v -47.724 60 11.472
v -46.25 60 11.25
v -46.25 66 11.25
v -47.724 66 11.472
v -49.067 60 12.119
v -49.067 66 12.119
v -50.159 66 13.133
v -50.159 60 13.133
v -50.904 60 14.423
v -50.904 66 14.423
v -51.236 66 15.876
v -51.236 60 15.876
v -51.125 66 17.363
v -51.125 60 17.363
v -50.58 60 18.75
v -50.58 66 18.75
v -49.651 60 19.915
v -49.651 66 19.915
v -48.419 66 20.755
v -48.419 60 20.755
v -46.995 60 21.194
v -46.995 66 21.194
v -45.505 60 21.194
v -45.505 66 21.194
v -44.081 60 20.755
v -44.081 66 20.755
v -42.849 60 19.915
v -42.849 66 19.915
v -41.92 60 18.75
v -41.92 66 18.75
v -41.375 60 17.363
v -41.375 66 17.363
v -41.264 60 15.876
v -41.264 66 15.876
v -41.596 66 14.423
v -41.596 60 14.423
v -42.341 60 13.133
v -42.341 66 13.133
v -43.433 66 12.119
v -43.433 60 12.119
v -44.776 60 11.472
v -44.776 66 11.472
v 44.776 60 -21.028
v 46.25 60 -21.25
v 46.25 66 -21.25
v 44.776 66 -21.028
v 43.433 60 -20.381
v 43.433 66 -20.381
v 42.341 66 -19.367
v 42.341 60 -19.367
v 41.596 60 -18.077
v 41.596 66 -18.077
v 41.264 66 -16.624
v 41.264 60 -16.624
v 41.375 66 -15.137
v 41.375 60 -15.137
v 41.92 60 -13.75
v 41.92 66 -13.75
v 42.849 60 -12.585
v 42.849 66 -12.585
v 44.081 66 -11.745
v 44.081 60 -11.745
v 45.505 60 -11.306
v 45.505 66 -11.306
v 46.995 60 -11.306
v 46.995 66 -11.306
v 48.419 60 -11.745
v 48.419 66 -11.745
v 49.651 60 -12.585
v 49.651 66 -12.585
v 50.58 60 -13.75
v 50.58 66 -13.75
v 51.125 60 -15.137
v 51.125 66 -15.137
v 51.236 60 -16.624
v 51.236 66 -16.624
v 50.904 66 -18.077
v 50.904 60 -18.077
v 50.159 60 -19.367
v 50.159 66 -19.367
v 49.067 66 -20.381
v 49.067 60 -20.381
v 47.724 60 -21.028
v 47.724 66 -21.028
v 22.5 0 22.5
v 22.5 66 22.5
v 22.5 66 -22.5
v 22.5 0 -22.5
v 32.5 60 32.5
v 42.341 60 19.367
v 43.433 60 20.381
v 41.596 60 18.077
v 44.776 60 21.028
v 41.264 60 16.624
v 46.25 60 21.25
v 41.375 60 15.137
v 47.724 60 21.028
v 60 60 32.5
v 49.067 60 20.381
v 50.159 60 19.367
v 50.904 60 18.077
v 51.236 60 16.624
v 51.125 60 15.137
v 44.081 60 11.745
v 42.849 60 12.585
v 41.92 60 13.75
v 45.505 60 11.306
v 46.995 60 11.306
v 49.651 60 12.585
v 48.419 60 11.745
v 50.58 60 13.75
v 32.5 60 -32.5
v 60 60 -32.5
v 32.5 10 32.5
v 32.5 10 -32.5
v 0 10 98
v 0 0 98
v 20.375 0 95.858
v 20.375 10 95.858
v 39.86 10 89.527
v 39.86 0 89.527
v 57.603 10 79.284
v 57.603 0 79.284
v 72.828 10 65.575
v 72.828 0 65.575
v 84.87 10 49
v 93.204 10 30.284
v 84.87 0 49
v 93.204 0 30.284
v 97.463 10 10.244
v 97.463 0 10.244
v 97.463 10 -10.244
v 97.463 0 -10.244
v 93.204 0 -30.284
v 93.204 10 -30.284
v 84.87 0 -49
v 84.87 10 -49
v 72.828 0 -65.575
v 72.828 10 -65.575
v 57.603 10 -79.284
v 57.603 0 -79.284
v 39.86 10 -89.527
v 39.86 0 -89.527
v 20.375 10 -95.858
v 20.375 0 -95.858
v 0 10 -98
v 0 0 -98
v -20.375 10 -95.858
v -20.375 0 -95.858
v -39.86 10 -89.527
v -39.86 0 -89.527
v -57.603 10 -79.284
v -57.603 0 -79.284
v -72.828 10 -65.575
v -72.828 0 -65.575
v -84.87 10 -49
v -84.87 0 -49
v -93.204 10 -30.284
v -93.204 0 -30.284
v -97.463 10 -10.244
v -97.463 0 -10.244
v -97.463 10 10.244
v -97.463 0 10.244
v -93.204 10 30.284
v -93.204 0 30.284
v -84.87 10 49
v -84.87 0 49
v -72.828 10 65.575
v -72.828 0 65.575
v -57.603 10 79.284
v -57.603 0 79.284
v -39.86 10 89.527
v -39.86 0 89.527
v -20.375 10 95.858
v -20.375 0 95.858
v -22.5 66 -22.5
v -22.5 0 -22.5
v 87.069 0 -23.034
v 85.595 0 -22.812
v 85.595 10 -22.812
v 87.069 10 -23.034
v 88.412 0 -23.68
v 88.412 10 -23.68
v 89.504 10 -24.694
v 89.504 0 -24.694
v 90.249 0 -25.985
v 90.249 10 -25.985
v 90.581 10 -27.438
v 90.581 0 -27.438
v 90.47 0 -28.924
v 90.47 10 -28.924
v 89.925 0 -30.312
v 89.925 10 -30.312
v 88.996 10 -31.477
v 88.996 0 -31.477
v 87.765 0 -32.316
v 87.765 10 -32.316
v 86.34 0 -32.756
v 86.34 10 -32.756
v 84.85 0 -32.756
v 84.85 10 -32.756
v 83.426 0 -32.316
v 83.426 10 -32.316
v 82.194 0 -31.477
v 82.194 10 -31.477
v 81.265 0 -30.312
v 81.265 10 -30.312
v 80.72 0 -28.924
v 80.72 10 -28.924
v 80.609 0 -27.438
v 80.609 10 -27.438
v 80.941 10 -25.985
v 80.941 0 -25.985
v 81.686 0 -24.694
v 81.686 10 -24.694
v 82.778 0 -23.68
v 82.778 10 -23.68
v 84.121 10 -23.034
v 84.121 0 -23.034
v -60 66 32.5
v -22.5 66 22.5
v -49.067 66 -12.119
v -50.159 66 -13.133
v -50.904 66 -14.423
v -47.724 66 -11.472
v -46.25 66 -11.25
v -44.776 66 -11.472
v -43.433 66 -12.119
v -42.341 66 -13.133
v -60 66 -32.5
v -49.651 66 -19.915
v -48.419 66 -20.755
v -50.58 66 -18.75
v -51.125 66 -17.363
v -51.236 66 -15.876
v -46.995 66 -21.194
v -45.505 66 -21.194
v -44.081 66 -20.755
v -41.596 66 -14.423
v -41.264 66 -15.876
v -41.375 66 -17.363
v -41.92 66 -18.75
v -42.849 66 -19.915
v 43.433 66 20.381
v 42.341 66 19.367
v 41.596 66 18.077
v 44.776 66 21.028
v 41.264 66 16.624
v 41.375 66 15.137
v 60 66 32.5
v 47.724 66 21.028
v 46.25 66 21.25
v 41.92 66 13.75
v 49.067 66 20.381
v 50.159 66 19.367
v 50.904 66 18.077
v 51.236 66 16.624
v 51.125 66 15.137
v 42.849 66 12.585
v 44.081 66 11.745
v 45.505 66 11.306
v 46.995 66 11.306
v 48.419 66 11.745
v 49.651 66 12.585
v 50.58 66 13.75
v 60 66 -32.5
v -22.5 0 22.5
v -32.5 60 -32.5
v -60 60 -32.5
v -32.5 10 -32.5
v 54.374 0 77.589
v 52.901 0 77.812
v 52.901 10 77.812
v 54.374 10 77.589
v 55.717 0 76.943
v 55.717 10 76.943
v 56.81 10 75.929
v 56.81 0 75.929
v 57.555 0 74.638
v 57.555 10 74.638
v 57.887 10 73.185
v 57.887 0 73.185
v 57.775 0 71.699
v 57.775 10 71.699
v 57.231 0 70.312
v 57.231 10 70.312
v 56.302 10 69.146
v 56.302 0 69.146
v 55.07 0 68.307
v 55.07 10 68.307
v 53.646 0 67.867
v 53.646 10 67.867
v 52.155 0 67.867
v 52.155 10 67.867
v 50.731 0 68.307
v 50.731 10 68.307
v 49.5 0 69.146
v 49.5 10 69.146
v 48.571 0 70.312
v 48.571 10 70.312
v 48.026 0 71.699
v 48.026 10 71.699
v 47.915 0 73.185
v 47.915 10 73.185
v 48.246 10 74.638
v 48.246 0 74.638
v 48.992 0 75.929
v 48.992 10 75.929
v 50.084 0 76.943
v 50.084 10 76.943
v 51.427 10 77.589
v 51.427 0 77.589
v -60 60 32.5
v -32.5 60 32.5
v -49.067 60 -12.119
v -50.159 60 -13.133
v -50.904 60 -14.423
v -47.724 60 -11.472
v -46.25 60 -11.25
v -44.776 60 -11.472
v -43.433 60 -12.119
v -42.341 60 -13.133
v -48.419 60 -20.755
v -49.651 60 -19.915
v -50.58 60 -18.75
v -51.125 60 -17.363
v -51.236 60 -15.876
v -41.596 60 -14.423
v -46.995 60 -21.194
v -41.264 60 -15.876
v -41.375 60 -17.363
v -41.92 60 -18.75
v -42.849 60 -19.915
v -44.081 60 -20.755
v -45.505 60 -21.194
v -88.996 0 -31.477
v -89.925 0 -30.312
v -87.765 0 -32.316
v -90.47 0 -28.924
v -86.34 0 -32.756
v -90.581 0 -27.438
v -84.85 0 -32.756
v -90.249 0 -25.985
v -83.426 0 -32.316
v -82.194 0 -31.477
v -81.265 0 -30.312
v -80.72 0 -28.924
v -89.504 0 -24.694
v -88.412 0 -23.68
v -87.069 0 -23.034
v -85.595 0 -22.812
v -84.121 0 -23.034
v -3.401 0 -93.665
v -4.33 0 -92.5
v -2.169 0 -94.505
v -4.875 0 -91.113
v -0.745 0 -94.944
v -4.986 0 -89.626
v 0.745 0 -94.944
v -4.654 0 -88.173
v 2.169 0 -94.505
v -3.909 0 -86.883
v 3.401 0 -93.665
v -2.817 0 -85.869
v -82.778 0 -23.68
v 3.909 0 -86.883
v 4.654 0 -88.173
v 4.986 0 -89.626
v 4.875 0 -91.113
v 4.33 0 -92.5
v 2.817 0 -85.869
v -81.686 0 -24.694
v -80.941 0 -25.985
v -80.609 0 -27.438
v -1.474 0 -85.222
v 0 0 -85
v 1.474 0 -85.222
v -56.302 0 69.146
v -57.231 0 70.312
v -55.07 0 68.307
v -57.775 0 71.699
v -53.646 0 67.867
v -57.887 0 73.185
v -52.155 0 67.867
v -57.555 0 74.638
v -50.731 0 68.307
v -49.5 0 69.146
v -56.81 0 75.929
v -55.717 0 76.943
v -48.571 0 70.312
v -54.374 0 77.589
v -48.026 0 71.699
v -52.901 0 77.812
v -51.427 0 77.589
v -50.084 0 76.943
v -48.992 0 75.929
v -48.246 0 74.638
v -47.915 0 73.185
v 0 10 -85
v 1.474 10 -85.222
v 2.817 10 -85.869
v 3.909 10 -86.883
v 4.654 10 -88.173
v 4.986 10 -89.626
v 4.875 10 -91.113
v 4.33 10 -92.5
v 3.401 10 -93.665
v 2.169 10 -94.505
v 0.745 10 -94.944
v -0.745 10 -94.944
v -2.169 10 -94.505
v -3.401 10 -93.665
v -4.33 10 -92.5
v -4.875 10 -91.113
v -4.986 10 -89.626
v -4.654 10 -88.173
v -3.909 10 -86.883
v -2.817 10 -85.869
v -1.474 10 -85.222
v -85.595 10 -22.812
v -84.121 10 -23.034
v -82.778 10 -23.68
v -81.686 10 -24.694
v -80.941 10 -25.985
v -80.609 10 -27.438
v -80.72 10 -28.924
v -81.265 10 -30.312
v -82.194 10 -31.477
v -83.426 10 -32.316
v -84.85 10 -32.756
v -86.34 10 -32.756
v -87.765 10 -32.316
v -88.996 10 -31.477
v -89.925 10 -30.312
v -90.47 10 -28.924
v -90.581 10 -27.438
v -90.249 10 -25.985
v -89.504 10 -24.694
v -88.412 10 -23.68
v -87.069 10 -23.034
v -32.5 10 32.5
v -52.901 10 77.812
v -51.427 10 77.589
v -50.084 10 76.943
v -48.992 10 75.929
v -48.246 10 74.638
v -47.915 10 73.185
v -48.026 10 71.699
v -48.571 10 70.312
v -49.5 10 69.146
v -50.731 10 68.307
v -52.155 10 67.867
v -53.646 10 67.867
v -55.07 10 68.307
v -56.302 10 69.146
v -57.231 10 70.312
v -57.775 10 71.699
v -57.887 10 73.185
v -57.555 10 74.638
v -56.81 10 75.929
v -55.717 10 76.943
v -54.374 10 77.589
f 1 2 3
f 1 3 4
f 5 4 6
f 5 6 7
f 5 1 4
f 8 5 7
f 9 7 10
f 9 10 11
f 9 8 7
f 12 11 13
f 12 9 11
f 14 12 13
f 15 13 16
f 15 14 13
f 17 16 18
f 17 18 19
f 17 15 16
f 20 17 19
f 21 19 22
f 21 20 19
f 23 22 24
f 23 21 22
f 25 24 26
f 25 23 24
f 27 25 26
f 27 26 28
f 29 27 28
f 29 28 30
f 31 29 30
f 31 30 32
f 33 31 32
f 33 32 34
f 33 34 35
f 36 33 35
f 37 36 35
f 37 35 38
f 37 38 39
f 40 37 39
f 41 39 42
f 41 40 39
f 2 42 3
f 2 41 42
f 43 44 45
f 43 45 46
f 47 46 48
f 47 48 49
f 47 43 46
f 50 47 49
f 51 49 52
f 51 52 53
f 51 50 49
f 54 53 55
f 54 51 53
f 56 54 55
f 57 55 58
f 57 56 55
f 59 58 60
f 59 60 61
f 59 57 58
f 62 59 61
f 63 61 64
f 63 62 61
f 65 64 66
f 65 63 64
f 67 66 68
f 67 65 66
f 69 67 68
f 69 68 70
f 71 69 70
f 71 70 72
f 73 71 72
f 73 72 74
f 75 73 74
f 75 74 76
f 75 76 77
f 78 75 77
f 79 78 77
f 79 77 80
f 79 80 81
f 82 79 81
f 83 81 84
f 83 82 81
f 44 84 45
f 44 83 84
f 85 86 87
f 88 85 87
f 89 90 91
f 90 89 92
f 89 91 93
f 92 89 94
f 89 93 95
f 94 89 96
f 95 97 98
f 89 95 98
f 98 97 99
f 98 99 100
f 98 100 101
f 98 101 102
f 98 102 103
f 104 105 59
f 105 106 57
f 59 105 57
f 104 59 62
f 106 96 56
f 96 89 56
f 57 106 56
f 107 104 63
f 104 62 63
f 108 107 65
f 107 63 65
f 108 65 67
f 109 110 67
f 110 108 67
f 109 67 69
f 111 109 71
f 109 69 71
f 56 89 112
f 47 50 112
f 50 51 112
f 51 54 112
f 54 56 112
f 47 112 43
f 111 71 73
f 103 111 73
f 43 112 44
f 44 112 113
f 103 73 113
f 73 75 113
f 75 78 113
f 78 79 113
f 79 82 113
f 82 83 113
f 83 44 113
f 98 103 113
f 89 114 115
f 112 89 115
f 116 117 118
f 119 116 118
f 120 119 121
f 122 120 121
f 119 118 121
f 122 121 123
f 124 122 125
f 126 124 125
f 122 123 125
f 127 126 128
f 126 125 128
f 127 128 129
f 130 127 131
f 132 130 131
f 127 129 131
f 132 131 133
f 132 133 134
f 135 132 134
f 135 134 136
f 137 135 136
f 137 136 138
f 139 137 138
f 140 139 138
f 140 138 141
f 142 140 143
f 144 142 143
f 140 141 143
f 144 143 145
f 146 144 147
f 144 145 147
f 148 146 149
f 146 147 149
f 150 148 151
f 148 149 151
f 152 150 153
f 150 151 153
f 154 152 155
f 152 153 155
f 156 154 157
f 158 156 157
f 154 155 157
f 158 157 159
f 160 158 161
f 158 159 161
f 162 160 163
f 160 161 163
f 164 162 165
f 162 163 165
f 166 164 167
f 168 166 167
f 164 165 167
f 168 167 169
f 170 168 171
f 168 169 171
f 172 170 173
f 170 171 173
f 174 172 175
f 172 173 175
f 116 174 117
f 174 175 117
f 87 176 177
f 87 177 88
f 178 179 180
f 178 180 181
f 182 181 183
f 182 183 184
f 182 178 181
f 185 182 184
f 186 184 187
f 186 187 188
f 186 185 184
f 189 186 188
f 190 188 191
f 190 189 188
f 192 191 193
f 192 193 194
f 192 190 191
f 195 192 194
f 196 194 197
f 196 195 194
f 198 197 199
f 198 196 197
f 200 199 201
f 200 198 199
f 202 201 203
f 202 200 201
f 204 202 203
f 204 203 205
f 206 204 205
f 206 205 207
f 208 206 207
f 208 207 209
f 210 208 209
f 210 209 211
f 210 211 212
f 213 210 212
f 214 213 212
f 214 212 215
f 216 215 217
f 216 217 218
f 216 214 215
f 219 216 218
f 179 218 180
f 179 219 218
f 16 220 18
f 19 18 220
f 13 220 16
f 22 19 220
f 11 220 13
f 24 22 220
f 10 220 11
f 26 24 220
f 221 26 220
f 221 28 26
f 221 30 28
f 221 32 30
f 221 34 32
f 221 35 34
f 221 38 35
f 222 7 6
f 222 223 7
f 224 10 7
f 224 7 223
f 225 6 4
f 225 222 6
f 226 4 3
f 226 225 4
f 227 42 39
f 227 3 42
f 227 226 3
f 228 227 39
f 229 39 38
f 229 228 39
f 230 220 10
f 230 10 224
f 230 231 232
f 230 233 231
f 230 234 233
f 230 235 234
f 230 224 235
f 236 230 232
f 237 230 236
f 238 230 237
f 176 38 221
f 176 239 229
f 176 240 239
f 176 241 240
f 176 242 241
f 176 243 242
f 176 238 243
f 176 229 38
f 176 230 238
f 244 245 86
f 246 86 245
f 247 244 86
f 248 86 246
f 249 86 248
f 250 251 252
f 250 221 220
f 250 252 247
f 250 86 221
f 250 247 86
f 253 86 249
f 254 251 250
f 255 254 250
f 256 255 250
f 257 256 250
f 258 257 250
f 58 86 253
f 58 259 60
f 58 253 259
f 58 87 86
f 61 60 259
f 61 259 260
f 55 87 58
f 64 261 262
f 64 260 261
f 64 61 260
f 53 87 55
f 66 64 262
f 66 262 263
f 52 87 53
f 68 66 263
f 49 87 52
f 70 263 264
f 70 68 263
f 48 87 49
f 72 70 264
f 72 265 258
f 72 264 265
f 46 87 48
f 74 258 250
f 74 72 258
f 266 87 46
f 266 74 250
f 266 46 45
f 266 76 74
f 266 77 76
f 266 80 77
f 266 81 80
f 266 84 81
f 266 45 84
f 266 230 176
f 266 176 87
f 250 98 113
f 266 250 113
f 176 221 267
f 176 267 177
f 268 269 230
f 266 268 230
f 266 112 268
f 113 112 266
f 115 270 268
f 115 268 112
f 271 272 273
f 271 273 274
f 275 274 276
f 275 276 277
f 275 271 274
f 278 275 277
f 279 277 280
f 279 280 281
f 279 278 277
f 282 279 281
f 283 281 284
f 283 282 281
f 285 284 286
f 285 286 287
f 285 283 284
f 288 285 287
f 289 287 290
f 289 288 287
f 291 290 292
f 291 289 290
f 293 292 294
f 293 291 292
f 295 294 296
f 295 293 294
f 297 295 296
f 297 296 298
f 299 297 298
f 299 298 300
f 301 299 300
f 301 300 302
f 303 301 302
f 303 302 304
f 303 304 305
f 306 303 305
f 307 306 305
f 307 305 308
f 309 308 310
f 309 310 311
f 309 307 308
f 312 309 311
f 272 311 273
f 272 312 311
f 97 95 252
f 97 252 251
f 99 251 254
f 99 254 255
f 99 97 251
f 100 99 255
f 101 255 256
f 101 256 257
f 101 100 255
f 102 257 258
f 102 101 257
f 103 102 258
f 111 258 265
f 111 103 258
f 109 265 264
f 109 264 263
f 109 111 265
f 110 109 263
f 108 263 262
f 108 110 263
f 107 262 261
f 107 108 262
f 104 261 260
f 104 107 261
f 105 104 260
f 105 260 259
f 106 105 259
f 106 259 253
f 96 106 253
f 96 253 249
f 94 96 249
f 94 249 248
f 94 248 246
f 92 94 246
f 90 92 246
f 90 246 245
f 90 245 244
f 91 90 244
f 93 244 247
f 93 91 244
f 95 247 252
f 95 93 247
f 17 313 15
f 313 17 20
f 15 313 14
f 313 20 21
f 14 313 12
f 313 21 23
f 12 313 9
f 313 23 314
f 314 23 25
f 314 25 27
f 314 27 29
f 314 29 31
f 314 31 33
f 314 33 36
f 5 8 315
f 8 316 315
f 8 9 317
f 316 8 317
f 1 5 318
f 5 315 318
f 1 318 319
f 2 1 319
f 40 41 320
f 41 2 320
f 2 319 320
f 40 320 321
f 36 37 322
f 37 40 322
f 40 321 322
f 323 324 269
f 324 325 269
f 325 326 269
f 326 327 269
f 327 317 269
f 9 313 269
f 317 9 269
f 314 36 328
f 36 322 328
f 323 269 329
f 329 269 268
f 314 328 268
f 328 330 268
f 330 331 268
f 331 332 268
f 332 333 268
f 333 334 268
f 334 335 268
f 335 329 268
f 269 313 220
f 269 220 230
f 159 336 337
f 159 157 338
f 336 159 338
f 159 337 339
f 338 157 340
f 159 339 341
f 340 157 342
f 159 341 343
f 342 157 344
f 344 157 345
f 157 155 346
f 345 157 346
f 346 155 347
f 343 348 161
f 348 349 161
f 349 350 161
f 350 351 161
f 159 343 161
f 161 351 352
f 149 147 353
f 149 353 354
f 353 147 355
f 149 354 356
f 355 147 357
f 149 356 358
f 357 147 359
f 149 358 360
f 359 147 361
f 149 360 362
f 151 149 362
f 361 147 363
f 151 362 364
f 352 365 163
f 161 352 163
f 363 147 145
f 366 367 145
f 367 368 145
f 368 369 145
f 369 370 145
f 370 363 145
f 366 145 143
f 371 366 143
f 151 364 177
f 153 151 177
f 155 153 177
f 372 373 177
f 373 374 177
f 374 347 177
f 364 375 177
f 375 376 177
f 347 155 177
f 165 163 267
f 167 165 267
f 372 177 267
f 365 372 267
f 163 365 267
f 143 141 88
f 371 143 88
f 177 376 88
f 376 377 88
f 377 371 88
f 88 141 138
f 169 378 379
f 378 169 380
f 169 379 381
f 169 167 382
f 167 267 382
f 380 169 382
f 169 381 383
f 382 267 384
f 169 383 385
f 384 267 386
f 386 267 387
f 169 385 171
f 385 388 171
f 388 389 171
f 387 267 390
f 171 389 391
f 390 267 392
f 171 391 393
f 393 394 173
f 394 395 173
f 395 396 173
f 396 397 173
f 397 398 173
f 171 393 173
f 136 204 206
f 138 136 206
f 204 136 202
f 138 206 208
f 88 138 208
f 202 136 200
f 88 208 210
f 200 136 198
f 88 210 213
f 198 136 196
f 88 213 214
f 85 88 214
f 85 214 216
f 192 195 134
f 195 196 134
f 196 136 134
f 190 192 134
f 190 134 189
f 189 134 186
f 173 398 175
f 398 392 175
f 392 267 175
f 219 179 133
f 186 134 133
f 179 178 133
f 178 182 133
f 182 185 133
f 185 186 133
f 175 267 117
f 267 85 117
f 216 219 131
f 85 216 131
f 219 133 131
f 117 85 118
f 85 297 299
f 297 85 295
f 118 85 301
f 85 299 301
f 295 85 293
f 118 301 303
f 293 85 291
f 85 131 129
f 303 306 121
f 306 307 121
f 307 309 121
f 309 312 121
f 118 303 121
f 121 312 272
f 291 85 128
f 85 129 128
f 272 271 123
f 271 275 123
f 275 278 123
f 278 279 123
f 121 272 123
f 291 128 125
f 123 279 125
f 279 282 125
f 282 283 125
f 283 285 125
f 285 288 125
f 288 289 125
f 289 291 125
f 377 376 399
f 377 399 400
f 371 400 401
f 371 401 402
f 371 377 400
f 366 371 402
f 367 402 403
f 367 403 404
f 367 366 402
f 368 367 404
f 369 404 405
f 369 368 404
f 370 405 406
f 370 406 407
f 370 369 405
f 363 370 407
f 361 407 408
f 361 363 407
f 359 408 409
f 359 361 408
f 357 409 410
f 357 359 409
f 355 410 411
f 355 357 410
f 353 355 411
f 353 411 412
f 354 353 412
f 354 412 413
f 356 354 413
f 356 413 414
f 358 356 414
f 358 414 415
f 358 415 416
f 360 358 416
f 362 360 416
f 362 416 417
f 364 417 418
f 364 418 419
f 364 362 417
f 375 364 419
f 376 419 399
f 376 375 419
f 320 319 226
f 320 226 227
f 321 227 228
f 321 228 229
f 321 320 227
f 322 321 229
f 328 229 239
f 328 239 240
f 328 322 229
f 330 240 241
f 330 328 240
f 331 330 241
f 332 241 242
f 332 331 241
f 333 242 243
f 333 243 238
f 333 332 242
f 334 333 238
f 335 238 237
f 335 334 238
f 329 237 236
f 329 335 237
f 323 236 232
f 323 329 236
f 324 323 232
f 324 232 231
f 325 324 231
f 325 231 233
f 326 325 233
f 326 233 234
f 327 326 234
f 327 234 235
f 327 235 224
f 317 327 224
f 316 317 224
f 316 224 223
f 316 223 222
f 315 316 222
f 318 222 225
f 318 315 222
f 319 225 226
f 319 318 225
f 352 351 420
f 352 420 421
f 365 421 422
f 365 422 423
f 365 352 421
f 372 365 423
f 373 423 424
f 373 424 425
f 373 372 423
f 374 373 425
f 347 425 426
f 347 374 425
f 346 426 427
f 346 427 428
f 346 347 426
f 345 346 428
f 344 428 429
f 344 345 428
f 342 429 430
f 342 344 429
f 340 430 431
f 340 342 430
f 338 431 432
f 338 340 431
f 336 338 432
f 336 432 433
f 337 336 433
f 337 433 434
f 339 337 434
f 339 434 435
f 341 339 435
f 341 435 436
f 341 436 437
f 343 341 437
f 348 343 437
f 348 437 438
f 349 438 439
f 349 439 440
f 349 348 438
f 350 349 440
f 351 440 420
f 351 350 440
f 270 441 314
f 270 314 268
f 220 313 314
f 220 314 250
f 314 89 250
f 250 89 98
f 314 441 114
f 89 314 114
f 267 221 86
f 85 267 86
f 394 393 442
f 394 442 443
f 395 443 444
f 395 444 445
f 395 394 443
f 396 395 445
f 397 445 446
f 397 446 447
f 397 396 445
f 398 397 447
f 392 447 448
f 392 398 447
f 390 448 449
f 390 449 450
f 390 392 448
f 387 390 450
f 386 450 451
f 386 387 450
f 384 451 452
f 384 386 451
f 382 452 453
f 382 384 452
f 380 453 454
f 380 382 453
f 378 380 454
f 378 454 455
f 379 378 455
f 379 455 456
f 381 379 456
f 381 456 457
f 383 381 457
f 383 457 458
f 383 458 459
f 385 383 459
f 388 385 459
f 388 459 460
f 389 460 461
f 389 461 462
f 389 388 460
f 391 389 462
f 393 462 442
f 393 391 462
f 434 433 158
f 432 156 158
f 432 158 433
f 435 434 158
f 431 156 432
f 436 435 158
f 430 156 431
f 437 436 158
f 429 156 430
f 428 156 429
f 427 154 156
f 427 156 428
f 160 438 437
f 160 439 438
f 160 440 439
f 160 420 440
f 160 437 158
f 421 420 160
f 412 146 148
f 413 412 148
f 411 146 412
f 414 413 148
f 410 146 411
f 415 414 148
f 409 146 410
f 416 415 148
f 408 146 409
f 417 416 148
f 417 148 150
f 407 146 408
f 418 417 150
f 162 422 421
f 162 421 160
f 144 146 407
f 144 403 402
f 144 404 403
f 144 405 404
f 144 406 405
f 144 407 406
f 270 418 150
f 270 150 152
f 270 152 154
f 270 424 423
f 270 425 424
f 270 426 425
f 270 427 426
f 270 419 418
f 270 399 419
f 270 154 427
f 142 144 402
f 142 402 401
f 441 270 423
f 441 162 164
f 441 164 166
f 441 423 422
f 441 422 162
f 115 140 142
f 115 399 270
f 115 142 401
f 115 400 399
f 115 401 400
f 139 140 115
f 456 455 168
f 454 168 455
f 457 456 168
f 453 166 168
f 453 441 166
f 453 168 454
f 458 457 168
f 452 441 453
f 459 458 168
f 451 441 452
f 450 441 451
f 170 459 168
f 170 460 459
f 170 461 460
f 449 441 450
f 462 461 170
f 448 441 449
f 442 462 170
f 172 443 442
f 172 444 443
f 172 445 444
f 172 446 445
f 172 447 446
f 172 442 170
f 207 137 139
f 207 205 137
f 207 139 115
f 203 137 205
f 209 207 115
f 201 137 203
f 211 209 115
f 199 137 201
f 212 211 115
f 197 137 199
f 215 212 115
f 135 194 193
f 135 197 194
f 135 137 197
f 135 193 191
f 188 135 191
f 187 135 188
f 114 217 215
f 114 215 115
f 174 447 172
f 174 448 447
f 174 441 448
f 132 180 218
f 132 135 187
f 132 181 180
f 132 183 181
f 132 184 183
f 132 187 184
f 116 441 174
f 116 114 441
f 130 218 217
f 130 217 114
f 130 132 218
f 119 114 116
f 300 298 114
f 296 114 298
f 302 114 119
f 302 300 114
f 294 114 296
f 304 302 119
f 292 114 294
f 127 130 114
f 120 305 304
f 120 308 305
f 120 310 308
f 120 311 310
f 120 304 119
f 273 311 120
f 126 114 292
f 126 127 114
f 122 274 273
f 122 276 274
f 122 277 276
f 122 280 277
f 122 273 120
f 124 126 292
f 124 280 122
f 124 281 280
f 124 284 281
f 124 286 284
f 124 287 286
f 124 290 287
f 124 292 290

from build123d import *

# Parameters (mm, degrees)
SKETCH1_R           = 98
SKETCH1_R_2         = 5
BOSS_EXTRUDE1_DEPTH = 10
SKETCH2_W           = 65
SKETCH2_H           = 65
BOSS_EXTRUDE2_DEPTH = 50
SKETCH3_W           = 120
SKETCH3_H           = 65
SKETCH3_R           = 5
BOSS_EXTRUDE3_DEPTH = 6
SKETCH4_W           = 45
SKETCH4_H           = 45
CUT_EXTRUDE1_DEPTH  = 154.50570022


with BuildPart() as part:
    # Sketch1 → Boss-Extrude1 (new body)
    with BuildSketch(Plane(origin=(0, 0, 0), x_dir=(1, 0, 0), z_dir=(0, 1, 0))):
        with Locations(Location((0, 0, 0), (0, 0, 270))):
            Circle(SKETCH1_R)
        with Locations(Location((0, 90, 0), (0, 0, 270))):
            Circle(SKETCH1_R_2, mode=Mode.SUBTRACT)
        with Locations(Location((85.595086467, 27.811529494, 0), (0, 0, 270))):
            Circle(SKETCH1_R_2, mode=Mode.SUBTRACT)
        with Locations(Location((52.900672706, -72.811529494, 0), (0, 0, 270))):
            Circle(SKETCH1_R_2, mode=Mode.SUBTRACT)
        with Locations(Location((-52.900672706, -72.811529494, 0), (0, 0, 270))):
            Circle(SKETCH1_R_2, mode=Mode.SUBTRACT)
        with Locations(Location((-85.595086467, 27.811529494, 0), (0, 0, 270))):
            Circle(SKETCH1_R_2, mode=Mode.SUBTRACT)
    extrude(amount=BOSS_EXTRUDE1_DEPTH)

    # Sketch2 → Boss-Extrude2 (add)
    with BuildSketch(Plane(origin=(0, 10, 0), x_dir=(1, 0, 0), z_dir=(0, 1, 0))):
        Rectangle(SKETCH2_W, SKETCH2_H)
    extrude(amount=BOSS_EXTRUDE2_DEPTH)

    # Sketch3 → Boss-Extrude3 (add)
    with BuildSketch(Plane(origin=(0, 60, 0), x_dir=(1, 0, 0), z_dir=(0, 1, 0))):
        Rectangle(SKETCH3_W, SKETCH3_H)
        with Locations(Location((-46.25, 16.25, 0), (0, 0, 270))):
            Circle(SKETCH3_R, mode=Mode.SUBTRACT)
        with Locations(Location((46.25, 16.25, 0), (0, 0, 90))):
            Circle(SKETCH3_R, mode=Mode.SUBTRACT)
        with Locations(Location((46.25, -16.25, 0), (0, 0, 270))):
            Circle(SKETCH3_R, mode=Mode.SUBTRACT)
        with Locations(Location((-46.25, -16.25, 0), (0, 0, 90))):
            Circle(SKETCH3_R, mode=Mode.SUBTRACT)
    extrude(amount=BOSS_EXTRUDE3_DEPTH)

    # Sketch4 → Cut-Extrude1 (cut, through all)
    with BuildSketch(Plane(origin=(0, 66, 0), x_dir=(1, 0, 0), z_dir=(0, 1, 0))):
        Rectangle(SKETCH4_W, SKETCH4_H)
    extrude(amount=-CUT_EXTRUDE1_DEPTH, mode=Mode.SUBTRACT)


solid = part.part
